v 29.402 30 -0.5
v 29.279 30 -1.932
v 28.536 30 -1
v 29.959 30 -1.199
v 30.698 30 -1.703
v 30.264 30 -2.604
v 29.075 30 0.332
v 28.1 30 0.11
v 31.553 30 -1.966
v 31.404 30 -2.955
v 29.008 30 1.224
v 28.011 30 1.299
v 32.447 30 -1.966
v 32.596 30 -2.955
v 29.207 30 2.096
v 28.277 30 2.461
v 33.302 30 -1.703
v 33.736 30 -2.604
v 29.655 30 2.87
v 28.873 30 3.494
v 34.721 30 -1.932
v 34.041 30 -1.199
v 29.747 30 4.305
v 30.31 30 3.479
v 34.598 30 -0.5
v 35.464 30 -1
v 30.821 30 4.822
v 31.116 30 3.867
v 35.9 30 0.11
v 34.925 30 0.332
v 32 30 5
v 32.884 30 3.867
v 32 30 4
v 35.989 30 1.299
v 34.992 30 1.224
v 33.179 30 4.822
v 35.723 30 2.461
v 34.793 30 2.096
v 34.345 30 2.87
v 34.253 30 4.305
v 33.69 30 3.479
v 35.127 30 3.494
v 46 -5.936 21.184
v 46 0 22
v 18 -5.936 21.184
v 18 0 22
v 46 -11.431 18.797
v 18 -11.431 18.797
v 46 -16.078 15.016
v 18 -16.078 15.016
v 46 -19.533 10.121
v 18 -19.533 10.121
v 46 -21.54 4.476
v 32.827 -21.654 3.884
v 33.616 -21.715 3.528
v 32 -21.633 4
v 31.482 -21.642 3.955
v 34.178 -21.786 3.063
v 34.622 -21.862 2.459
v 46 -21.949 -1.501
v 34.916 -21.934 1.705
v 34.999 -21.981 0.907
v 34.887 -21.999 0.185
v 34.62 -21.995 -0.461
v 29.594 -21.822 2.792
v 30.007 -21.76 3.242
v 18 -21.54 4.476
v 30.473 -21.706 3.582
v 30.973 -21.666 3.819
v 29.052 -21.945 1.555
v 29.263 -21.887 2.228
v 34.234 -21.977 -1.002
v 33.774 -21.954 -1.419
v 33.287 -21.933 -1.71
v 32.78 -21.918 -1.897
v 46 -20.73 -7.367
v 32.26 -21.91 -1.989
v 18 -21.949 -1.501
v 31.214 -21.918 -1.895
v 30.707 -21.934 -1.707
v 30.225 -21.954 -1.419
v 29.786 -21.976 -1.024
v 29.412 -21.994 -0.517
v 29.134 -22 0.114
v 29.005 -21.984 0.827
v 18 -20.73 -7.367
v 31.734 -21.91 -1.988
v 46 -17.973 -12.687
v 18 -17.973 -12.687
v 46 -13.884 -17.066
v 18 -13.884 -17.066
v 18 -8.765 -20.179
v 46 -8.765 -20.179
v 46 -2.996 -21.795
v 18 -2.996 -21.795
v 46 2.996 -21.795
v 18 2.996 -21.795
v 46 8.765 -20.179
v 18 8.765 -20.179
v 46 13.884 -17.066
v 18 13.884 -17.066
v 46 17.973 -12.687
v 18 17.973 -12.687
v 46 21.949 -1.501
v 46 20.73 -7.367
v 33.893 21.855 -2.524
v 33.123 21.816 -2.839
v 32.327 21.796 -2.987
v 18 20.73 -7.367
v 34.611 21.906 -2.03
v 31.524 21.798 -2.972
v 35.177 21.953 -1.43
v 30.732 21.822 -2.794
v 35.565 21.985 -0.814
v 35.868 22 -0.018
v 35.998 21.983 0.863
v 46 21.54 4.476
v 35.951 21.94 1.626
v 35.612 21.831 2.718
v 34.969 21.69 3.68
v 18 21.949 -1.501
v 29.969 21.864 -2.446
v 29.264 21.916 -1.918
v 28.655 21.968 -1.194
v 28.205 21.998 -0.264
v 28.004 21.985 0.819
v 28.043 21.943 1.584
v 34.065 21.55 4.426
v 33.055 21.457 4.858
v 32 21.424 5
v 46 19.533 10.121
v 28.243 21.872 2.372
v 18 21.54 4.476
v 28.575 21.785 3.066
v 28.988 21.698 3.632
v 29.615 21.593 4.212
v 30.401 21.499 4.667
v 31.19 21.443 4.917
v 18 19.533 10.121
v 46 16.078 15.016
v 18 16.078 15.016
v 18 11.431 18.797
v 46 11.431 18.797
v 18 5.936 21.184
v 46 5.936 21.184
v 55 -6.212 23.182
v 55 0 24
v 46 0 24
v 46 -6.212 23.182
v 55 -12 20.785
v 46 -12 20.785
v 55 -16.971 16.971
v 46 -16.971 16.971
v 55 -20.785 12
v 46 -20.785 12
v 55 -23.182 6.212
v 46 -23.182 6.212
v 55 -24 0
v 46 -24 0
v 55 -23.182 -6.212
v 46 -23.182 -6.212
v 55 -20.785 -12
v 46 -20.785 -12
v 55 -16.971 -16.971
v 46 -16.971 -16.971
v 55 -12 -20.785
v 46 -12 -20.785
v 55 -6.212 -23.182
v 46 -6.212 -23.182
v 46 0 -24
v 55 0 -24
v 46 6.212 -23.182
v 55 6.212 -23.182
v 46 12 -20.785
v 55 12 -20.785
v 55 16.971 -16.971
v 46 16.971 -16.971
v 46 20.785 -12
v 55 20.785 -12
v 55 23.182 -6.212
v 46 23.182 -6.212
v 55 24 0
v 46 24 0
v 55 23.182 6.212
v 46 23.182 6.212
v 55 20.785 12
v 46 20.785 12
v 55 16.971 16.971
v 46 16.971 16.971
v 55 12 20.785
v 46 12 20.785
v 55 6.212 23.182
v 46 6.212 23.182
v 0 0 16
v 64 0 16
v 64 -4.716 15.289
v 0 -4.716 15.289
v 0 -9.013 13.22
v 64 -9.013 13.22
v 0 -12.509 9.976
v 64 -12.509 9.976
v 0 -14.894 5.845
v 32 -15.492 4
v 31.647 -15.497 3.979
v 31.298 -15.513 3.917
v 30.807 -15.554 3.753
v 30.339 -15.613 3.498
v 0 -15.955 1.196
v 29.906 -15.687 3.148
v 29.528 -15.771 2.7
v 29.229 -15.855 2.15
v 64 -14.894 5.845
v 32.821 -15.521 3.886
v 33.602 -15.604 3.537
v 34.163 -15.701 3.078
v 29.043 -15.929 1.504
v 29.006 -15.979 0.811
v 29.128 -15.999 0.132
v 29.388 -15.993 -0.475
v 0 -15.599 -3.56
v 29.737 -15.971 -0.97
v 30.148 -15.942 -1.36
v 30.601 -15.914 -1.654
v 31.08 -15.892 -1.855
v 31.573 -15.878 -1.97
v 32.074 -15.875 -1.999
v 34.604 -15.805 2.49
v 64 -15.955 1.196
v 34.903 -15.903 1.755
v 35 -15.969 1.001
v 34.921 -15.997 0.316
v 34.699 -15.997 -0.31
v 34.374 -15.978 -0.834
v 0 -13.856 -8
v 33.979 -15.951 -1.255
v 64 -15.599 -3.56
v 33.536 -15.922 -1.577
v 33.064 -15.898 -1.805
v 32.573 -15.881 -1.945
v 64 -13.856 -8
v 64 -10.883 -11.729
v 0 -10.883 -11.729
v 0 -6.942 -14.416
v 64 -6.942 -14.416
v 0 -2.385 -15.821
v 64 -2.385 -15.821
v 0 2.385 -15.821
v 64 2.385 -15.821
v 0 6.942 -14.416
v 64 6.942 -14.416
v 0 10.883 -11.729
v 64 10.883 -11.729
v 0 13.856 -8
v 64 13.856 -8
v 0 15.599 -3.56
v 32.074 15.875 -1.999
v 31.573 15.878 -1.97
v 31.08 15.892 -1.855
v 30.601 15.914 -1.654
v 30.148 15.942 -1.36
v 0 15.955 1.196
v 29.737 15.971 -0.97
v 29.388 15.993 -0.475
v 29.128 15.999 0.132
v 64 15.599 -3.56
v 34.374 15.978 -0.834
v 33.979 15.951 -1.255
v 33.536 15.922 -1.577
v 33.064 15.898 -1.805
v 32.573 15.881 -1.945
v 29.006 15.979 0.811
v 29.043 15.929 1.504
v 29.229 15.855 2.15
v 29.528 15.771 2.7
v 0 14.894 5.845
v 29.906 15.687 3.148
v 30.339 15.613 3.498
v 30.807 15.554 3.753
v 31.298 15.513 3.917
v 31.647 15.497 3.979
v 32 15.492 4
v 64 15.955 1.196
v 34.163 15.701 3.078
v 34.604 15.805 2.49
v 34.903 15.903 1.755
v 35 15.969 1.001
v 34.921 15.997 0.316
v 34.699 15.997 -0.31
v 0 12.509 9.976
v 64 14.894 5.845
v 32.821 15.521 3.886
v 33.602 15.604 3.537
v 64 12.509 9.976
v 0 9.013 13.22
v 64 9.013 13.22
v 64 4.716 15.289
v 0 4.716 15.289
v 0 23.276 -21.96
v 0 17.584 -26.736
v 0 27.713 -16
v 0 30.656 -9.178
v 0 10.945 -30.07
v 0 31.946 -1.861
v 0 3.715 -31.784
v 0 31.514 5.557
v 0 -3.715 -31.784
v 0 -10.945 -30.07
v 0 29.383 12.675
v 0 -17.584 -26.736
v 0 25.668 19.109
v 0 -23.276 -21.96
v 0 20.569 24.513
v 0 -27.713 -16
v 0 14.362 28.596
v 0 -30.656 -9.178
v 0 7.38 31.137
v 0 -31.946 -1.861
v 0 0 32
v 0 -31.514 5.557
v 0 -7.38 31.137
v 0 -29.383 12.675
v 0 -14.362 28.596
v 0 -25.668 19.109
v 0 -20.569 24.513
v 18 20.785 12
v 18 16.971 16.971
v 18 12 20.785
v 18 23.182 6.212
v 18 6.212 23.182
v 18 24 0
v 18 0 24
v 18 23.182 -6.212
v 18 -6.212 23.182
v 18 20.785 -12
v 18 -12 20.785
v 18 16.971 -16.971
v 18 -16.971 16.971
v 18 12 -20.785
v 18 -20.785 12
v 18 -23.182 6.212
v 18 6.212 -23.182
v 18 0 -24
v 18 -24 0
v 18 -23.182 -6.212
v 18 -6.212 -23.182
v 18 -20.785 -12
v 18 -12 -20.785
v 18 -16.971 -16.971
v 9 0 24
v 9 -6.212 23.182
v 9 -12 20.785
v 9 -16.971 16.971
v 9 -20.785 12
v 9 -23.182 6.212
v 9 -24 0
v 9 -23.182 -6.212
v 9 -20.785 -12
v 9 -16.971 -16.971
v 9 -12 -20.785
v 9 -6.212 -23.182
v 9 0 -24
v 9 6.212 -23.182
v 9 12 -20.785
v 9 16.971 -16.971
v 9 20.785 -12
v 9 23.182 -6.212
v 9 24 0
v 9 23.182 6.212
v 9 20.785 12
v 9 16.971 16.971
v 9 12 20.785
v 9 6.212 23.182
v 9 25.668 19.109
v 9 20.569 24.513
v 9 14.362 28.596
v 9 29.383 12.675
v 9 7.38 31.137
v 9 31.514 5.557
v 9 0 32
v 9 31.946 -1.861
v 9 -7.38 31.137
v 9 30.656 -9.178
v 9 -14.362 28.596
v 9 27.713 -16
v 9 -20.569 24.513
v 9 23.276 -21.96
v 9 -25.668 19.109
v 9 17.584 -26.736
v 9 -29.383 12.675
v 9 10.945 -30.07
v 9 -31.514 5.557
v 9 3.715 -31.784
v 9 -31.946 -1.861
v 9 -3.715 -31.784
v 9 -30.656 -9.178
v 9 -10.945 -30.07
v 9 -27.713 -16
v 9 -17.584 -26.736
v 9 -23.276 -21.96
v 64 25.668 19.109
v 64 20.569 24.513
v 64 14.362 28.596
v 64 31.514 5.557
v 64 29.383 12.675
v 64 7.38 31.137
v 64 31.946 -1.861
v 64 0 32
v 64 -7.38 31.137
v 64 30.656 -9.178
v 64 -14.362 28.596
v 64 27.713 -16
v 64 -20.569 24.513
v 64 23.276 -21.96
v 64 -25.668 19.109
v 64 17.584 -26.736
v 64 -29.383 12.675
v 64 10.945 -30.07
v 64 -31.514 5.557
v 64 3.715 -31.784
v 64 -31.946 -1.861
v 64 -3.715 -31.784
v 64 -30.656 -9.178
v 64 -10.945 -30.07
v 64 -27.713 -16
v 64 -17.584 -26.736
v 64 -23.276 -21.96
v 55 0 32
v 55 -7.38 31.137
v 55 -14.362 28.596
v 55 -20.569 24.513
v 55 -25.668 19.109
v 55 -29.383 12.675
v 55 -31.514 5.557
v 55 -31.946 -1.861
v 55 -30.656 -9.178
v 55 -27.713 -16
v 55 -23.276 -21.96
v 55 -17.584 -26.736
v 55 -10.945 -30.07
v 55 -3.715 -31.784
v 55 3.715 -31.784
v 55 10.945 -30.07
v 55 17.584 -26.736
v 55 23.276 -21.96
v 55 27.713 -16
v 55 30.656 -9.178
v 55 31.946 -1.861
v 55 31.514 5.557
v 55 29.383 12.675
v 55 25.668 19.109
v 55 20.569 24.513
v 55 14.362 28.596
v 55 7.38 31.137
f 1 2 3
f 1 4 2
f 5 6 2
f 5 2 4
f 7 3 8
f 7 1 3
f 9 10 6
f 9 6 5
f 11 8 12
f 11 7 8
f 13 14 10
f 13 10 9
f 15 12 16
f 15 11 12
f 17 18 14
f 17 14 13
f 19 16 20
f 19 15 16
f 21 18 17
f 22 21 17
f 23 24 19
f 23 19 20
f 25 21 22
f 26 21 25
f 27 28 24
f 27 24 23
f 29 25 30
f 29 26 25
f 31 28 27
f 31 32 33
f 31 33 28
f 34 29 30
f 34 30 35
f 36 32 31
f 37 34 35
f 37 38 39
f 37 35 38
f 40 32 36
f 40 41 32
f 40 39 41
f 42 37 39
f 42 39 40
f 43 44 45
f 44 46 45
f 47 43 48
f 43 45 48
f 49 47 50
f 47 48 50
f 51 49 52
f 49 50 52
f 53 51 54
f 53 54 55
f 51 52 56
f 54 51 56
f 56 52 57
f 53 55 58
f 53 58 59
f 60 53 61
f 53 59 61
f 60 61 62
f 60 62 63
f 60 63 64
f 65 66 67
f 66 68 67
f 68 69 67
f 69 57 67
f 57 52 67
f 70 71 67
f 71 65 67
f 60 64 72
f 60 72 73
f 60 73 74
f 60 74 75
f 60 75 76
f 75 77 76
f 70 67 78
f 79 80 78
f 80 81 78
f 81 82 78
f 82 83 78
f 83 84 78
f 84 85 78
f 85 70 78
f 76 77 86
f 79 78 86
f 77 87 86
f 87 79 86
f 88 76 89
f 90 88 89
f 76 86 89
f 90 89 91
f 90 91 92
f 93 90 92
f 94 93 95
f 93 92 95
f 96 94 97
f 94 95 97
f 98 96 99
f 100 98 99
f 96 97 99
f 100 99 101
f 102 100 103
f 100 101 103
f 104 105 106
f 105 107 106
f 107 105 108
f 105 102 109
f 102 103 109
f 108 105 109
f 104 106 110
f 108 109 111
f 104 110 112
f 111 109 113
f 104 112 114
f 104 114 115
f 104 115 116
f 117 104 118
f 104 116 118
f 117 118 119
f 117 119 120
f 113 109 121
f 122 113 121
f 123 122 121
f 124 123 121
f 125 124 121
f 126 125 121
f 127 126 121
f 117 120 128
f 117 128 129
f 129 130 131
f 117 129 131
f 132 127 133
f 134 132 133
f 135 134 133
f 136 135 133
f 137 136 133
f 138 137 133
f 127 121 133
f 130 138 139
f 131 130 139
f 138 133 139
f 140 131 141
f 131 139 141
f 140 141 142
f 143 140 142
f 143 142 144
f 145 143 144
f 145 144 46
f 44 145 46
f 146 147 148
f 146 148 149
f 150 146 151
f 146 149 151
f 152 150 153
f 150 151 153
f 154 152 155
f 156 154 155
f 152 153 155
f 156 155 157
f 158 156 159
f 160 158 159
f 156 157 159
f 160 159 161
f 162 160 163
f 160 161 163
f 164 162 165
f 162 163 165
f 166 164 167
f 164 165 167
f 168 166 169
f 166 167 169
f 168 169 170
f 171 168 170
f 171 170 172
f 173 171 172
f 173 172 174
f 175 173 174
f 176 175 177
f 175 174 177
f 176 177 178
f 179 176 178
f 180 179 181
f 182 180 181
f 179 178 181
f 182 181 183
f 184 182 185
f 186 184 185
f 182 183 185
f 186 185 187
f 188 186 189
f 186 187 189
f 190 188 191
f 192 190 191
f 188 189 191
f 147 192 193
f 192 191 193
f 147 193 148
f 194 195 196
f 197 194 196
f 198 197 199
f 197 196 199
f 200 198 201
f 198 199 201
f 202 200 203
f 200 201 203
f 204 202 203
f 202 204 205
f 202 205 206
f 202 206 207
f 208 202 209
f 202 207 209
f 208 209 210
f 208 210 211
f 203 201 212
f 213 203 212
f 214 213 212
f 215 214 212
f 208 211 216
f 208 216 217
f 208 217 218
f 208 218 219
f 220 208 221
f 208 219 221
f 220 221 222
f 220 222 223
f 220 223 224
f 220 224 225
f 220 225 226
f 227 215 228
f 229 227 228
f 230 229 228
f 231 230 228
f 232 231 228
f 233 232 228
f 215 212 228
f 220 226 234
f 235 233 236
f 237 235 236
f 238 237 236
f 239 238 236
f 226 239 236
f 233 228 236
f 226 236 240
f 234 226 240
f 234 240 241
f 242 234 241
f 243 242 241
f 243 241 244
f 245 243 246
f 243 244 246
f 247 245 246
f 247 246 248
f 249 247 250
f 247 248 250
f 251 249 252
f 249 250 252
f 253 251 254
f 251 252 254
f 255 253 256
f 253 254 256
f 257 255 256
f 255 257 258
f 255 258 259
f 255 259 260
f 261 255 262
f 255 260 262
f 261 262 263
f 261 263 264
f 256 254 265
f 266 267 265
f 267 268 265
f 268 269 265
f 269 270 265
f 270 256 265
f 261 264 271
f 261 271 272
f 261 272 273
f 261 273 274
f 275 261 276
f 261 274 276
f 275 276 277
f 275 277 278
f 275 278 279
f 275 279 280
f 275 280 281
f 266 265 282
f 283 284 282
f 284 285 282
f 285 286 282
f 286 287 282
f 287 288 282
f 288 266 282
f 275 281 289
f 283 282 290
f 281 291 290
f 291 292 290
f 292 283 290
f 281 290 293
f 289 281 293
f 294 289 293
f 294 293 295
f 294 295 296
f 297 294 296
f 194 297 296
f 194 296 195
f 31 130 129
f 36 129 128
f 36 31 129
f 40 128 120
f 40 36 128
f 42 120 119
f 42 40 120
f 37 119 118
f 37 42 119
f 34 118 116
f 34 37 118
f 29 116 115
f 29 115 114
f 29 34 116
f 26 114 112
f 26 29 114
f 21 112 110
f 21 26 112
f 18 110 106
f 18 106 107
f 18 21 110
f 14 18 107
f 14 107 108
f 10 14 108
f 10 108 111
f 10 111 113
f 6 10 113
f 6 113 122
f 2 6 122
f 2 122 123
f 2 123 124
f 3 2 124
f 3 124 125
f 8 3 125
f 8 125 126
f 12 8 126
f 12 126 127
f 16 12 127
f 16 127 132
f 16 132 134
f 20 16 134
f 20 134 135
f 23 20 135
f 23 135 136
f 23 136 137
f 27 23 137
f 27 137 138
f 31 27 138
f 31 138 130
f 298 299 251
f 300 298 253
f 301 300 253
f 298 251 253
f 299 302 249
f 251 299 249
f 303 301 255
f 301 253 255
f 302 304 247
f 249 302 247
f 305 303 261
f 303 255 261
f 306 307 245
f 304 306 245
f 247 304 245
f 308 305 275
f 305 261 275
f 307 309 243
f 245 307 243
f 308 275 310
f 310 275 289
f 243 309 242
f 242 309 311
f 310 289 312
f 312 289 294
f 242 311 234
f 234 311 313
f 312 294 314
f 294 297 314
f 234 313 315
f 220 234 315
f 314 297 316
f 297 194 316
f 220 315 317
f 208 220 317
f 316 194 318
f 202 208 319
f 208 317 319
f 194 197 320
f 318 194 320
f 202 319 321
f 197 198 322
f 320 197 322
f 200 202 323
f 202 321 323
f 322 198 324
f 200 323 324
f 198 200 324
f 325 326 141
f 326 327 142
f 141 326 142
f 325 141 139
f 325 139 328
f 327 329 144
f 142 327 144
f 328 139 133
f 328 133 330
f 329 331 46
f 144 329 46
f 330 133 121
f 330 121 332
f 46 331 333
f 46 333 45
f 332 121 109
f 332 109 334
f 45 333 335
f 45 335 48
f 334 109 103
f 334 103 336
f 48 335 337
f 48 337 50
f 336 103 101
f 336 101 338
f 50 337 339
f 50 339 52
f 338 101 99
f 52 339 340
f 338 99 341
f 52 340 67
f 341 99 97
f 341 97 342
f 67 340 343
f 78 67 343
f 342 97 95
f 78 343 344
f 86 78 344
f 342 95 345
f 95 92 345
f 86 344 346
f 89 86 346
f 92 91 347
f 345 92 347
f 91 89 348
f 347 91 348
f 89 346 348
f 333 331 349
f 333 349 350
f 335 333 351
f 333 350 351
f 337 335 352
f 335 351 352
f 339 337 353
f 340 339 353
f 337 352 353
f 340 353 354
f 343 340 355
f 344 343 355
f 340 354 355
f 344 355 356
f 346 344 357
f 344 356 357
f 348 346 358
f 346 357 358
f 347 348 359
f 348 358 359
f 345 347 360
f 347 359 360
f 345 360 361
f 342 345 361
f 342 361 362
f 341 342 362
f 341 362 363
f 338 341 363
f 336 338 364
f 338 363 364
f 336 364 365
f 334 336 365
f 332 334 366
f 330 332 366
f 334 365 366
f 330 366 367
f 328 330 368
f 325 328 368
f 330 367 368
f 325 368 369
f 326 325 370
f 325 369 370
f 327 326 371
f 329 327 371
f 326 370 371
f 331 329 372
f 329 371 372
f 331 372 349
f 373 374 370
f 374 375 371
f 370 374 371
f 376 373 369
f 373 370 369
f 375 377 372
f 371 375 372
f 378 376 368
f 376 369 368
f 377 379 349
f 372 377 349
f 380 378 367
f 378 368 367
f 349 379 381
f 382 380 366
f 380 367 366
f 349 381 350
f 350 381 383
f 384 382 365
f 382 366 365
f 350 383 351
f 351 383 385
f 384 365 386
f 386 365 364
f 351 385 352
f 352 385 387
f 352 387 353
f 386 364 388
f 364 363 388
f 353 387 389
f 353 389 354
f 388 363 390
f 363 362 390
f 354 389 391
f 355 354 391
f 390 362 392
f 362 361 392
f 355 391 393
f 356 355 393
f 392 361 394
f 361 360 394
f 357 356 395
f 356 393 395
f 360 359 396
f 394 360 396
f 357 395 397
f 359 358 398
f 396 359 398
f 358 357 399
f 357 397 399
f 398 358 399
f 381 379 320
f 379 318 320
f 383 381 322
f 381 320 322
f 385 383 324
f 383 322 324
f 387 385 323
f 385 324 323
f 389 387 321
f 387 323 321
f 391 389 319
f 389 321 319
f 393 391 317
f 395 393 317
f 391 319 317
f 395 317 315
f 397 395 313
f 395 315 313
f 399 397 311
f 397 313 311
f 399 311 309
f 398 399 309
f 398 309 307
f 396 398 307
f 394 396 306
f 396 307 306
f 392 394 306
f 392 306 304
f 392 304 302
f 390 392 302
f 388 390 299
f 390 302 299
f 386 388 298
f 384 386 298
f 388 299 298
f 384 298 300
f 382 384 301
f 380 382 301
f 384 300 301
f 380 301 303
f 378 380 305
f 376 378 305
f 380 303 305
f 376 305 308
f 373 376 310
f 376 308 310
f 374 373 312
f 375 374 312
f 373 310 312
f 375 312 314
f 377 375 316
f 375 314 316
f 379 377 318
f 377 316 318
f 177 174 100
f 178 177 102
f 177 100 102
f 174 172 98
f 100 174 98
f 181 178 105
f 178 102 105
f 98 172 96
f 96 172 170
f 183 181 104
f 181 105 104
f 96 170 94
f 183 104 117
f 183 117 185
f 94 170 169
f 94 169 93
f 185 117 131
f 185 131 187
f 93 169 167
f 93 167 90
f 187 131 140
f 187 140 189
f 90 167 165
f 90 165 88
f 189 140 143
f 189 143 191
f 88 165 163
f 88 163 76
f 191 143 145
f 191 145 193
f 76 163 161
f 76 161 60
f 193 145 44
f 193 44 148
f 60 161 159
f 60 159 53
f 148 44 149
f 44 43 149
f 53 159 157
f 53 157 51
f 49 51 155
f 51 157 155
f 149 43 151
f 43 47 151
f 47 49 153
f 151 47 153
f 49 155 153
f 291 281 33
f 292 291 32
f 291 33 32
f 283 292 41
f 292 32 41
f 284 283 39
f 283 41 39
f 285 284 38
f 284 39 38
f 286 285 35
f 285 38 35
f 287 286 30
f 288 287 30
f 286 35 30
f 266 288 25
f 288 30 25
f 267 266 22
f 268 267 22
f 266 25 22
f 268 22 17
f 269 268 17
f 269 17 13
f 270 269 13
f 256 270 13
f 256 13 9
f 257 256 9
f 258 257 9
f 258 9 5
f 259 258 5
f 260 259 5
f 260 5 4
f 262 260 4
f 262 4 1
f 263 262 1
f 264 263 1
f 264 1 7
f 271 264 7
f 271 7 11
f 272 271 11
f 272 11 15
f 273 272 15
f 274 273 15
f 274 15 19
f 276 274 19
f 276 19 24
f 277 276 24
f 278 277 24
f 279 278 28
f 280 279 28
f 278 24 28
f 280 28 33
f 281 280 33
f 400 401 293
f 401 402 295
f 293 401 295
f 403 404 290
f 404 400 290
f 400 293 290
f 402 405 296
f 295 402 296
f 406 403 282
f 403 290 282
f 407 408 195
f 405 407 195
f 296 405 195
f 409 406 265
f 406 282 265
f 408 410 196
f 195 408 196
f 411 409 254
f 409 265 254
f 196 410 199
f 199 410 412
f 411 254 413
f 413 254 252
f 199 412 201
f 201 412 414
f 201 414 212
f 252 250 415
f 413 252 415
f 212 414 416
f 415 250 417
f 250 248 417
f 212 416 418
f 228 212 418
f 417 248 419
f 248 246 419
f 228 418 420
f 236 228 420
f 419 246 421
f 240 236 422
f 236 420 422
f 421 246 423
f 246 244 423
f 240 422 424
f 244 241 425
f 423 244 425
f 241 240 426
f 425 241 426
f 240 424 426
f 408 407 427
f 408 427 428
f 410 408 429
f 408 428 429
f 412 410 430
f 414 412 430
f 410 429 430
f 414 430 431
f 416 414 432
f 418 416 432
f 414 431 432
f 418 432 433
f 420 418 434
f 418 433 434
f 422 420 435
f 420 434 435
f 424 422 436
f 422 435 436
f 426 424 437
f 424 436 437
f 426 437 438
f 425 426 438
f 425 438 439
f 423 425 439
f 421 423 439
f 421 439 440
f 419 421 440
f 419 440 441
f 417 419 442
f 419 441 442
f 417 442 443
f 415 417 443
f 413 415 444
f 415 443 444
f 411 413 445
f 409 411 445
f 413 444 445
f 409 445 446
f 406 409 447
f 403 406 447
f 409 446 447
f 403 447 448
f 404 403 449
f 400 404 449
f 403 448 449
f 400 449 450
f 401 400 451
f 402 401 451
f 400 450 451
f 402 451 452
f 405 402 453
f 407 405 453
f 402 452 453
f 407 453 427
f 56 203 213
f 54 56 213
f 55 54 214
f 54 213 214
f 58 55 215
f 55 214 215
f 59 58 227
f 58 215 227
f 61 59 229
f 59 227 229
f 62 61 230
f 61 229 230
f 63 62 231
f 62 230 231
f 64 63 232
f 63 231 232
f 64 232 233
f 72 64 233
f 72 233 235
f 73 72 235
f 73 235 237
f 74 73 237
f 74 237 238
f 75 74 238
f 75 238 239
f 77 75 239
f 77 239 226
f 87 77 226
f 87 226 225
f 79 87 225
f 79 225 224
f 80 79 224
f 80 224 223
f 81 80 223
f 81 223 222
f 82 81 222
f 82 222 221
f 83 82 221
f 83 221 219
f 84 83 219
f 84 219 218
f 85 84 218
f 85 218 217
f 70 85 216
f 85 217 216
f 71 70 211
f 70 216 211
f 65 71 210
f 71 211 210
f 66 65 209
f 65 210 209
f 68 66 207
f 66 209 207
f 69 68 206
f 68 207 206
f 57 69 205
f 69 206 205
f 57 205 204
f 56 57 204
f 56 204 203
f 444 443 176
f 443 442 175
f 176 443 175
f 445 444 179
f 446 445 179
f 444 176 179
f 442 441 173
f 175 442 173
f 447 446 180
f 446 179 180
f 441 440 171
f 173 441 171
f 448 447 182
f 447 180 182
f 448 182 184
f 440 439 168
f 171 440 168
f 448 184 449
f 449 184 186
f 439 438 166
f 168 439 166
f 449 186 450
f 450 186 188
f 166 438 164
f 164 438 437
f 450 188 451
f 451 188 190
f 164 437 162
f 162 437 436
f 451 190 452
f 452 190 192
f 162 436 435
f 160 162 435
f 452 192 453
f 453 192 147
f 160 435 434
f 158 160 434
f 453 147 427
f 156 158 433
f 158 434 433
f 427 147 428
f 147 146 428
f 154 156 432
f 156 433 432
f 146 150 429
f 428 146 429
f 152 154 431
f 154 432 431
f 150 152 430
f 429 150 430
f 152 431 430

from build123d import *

# Parameters (mm, degrees)
BOSS_EXTRUDE1_REACH      = 96.678
BOSS_EXTRUDE1_END_RADIUS = 22
SKETCH2_R                = 4
SKETCH3_R                = 3
CUT_EXTRUDE1_DEPTH       = 95.678403028


with BuildPart() as part:
    # Sketch1 → Revolve1 (revolve)
    with BuildSketch(Plane.XY, mode=Mode.PRIVATE) as revolve1_sk:
        Polygon((0, 16), (64, 16), (64, 32), (55, 32), (55, 24), (46, 24), (46, 22), (18, 22), (18, 24), (9, 24), (9, 32), (0, 32), align=None)
    revolve(revolve1_sk.sketch.rotate(Axis((0, 0, 0), (1, 0, 0)), 90), axis=Axis((0, 0, 0), (1, 0, 0)))

    # Boss-Extrude1: up to this cylinder (the profile starts outside it)
    boss_extrude1_end = Plane(origin=(32, 0, 0), z_dir=(-1, 0, 0)) * Cylinder(BOSS_EXTRUDE1_END_RADIUS, 238.356, mode=Mode.PRIVATE)
    # Sketch2 → Boss-Extrude1 (add, up to the surface)
    with BuildSketch(Plane(origin=(0, 30, 0), x_dir=(1, 0, 0), z_dir=(0, 1, 0)), mode=Mode.PRIVATE) as boss_extrude1_sk1:
        with Locations(Location((32, -1, 0), (0, 0, 270))):
            Circle(SKETCH2_R)
    boss_extrude1_tool1 = extrude(boss_extrude1_sk1.sketch, amount=-BOSS_EXTRUDE1_REACH, mode=Mode.PRIVATE) - boss_extrude1_end
    add(boss_extrude1_tool1.solids().sort_by_distance((32, 30, 1))[0])

    # Sketch3 → Cut-Extrude1 (cut, through all)
    with BuildSketch(Plane(origin=(0, 30, 0), x_dir=(1, 0, 0), z_dir=(0, 1, 0))):
        with Locations(Location((32, -1, 0), (0, 0, 270))):
            Circle(SKETCH3_R)
    extrude(amount=-CUT_EXTRUDE1_DEPTH, mode=Mode.SUBTRACT)


solid = part.part
